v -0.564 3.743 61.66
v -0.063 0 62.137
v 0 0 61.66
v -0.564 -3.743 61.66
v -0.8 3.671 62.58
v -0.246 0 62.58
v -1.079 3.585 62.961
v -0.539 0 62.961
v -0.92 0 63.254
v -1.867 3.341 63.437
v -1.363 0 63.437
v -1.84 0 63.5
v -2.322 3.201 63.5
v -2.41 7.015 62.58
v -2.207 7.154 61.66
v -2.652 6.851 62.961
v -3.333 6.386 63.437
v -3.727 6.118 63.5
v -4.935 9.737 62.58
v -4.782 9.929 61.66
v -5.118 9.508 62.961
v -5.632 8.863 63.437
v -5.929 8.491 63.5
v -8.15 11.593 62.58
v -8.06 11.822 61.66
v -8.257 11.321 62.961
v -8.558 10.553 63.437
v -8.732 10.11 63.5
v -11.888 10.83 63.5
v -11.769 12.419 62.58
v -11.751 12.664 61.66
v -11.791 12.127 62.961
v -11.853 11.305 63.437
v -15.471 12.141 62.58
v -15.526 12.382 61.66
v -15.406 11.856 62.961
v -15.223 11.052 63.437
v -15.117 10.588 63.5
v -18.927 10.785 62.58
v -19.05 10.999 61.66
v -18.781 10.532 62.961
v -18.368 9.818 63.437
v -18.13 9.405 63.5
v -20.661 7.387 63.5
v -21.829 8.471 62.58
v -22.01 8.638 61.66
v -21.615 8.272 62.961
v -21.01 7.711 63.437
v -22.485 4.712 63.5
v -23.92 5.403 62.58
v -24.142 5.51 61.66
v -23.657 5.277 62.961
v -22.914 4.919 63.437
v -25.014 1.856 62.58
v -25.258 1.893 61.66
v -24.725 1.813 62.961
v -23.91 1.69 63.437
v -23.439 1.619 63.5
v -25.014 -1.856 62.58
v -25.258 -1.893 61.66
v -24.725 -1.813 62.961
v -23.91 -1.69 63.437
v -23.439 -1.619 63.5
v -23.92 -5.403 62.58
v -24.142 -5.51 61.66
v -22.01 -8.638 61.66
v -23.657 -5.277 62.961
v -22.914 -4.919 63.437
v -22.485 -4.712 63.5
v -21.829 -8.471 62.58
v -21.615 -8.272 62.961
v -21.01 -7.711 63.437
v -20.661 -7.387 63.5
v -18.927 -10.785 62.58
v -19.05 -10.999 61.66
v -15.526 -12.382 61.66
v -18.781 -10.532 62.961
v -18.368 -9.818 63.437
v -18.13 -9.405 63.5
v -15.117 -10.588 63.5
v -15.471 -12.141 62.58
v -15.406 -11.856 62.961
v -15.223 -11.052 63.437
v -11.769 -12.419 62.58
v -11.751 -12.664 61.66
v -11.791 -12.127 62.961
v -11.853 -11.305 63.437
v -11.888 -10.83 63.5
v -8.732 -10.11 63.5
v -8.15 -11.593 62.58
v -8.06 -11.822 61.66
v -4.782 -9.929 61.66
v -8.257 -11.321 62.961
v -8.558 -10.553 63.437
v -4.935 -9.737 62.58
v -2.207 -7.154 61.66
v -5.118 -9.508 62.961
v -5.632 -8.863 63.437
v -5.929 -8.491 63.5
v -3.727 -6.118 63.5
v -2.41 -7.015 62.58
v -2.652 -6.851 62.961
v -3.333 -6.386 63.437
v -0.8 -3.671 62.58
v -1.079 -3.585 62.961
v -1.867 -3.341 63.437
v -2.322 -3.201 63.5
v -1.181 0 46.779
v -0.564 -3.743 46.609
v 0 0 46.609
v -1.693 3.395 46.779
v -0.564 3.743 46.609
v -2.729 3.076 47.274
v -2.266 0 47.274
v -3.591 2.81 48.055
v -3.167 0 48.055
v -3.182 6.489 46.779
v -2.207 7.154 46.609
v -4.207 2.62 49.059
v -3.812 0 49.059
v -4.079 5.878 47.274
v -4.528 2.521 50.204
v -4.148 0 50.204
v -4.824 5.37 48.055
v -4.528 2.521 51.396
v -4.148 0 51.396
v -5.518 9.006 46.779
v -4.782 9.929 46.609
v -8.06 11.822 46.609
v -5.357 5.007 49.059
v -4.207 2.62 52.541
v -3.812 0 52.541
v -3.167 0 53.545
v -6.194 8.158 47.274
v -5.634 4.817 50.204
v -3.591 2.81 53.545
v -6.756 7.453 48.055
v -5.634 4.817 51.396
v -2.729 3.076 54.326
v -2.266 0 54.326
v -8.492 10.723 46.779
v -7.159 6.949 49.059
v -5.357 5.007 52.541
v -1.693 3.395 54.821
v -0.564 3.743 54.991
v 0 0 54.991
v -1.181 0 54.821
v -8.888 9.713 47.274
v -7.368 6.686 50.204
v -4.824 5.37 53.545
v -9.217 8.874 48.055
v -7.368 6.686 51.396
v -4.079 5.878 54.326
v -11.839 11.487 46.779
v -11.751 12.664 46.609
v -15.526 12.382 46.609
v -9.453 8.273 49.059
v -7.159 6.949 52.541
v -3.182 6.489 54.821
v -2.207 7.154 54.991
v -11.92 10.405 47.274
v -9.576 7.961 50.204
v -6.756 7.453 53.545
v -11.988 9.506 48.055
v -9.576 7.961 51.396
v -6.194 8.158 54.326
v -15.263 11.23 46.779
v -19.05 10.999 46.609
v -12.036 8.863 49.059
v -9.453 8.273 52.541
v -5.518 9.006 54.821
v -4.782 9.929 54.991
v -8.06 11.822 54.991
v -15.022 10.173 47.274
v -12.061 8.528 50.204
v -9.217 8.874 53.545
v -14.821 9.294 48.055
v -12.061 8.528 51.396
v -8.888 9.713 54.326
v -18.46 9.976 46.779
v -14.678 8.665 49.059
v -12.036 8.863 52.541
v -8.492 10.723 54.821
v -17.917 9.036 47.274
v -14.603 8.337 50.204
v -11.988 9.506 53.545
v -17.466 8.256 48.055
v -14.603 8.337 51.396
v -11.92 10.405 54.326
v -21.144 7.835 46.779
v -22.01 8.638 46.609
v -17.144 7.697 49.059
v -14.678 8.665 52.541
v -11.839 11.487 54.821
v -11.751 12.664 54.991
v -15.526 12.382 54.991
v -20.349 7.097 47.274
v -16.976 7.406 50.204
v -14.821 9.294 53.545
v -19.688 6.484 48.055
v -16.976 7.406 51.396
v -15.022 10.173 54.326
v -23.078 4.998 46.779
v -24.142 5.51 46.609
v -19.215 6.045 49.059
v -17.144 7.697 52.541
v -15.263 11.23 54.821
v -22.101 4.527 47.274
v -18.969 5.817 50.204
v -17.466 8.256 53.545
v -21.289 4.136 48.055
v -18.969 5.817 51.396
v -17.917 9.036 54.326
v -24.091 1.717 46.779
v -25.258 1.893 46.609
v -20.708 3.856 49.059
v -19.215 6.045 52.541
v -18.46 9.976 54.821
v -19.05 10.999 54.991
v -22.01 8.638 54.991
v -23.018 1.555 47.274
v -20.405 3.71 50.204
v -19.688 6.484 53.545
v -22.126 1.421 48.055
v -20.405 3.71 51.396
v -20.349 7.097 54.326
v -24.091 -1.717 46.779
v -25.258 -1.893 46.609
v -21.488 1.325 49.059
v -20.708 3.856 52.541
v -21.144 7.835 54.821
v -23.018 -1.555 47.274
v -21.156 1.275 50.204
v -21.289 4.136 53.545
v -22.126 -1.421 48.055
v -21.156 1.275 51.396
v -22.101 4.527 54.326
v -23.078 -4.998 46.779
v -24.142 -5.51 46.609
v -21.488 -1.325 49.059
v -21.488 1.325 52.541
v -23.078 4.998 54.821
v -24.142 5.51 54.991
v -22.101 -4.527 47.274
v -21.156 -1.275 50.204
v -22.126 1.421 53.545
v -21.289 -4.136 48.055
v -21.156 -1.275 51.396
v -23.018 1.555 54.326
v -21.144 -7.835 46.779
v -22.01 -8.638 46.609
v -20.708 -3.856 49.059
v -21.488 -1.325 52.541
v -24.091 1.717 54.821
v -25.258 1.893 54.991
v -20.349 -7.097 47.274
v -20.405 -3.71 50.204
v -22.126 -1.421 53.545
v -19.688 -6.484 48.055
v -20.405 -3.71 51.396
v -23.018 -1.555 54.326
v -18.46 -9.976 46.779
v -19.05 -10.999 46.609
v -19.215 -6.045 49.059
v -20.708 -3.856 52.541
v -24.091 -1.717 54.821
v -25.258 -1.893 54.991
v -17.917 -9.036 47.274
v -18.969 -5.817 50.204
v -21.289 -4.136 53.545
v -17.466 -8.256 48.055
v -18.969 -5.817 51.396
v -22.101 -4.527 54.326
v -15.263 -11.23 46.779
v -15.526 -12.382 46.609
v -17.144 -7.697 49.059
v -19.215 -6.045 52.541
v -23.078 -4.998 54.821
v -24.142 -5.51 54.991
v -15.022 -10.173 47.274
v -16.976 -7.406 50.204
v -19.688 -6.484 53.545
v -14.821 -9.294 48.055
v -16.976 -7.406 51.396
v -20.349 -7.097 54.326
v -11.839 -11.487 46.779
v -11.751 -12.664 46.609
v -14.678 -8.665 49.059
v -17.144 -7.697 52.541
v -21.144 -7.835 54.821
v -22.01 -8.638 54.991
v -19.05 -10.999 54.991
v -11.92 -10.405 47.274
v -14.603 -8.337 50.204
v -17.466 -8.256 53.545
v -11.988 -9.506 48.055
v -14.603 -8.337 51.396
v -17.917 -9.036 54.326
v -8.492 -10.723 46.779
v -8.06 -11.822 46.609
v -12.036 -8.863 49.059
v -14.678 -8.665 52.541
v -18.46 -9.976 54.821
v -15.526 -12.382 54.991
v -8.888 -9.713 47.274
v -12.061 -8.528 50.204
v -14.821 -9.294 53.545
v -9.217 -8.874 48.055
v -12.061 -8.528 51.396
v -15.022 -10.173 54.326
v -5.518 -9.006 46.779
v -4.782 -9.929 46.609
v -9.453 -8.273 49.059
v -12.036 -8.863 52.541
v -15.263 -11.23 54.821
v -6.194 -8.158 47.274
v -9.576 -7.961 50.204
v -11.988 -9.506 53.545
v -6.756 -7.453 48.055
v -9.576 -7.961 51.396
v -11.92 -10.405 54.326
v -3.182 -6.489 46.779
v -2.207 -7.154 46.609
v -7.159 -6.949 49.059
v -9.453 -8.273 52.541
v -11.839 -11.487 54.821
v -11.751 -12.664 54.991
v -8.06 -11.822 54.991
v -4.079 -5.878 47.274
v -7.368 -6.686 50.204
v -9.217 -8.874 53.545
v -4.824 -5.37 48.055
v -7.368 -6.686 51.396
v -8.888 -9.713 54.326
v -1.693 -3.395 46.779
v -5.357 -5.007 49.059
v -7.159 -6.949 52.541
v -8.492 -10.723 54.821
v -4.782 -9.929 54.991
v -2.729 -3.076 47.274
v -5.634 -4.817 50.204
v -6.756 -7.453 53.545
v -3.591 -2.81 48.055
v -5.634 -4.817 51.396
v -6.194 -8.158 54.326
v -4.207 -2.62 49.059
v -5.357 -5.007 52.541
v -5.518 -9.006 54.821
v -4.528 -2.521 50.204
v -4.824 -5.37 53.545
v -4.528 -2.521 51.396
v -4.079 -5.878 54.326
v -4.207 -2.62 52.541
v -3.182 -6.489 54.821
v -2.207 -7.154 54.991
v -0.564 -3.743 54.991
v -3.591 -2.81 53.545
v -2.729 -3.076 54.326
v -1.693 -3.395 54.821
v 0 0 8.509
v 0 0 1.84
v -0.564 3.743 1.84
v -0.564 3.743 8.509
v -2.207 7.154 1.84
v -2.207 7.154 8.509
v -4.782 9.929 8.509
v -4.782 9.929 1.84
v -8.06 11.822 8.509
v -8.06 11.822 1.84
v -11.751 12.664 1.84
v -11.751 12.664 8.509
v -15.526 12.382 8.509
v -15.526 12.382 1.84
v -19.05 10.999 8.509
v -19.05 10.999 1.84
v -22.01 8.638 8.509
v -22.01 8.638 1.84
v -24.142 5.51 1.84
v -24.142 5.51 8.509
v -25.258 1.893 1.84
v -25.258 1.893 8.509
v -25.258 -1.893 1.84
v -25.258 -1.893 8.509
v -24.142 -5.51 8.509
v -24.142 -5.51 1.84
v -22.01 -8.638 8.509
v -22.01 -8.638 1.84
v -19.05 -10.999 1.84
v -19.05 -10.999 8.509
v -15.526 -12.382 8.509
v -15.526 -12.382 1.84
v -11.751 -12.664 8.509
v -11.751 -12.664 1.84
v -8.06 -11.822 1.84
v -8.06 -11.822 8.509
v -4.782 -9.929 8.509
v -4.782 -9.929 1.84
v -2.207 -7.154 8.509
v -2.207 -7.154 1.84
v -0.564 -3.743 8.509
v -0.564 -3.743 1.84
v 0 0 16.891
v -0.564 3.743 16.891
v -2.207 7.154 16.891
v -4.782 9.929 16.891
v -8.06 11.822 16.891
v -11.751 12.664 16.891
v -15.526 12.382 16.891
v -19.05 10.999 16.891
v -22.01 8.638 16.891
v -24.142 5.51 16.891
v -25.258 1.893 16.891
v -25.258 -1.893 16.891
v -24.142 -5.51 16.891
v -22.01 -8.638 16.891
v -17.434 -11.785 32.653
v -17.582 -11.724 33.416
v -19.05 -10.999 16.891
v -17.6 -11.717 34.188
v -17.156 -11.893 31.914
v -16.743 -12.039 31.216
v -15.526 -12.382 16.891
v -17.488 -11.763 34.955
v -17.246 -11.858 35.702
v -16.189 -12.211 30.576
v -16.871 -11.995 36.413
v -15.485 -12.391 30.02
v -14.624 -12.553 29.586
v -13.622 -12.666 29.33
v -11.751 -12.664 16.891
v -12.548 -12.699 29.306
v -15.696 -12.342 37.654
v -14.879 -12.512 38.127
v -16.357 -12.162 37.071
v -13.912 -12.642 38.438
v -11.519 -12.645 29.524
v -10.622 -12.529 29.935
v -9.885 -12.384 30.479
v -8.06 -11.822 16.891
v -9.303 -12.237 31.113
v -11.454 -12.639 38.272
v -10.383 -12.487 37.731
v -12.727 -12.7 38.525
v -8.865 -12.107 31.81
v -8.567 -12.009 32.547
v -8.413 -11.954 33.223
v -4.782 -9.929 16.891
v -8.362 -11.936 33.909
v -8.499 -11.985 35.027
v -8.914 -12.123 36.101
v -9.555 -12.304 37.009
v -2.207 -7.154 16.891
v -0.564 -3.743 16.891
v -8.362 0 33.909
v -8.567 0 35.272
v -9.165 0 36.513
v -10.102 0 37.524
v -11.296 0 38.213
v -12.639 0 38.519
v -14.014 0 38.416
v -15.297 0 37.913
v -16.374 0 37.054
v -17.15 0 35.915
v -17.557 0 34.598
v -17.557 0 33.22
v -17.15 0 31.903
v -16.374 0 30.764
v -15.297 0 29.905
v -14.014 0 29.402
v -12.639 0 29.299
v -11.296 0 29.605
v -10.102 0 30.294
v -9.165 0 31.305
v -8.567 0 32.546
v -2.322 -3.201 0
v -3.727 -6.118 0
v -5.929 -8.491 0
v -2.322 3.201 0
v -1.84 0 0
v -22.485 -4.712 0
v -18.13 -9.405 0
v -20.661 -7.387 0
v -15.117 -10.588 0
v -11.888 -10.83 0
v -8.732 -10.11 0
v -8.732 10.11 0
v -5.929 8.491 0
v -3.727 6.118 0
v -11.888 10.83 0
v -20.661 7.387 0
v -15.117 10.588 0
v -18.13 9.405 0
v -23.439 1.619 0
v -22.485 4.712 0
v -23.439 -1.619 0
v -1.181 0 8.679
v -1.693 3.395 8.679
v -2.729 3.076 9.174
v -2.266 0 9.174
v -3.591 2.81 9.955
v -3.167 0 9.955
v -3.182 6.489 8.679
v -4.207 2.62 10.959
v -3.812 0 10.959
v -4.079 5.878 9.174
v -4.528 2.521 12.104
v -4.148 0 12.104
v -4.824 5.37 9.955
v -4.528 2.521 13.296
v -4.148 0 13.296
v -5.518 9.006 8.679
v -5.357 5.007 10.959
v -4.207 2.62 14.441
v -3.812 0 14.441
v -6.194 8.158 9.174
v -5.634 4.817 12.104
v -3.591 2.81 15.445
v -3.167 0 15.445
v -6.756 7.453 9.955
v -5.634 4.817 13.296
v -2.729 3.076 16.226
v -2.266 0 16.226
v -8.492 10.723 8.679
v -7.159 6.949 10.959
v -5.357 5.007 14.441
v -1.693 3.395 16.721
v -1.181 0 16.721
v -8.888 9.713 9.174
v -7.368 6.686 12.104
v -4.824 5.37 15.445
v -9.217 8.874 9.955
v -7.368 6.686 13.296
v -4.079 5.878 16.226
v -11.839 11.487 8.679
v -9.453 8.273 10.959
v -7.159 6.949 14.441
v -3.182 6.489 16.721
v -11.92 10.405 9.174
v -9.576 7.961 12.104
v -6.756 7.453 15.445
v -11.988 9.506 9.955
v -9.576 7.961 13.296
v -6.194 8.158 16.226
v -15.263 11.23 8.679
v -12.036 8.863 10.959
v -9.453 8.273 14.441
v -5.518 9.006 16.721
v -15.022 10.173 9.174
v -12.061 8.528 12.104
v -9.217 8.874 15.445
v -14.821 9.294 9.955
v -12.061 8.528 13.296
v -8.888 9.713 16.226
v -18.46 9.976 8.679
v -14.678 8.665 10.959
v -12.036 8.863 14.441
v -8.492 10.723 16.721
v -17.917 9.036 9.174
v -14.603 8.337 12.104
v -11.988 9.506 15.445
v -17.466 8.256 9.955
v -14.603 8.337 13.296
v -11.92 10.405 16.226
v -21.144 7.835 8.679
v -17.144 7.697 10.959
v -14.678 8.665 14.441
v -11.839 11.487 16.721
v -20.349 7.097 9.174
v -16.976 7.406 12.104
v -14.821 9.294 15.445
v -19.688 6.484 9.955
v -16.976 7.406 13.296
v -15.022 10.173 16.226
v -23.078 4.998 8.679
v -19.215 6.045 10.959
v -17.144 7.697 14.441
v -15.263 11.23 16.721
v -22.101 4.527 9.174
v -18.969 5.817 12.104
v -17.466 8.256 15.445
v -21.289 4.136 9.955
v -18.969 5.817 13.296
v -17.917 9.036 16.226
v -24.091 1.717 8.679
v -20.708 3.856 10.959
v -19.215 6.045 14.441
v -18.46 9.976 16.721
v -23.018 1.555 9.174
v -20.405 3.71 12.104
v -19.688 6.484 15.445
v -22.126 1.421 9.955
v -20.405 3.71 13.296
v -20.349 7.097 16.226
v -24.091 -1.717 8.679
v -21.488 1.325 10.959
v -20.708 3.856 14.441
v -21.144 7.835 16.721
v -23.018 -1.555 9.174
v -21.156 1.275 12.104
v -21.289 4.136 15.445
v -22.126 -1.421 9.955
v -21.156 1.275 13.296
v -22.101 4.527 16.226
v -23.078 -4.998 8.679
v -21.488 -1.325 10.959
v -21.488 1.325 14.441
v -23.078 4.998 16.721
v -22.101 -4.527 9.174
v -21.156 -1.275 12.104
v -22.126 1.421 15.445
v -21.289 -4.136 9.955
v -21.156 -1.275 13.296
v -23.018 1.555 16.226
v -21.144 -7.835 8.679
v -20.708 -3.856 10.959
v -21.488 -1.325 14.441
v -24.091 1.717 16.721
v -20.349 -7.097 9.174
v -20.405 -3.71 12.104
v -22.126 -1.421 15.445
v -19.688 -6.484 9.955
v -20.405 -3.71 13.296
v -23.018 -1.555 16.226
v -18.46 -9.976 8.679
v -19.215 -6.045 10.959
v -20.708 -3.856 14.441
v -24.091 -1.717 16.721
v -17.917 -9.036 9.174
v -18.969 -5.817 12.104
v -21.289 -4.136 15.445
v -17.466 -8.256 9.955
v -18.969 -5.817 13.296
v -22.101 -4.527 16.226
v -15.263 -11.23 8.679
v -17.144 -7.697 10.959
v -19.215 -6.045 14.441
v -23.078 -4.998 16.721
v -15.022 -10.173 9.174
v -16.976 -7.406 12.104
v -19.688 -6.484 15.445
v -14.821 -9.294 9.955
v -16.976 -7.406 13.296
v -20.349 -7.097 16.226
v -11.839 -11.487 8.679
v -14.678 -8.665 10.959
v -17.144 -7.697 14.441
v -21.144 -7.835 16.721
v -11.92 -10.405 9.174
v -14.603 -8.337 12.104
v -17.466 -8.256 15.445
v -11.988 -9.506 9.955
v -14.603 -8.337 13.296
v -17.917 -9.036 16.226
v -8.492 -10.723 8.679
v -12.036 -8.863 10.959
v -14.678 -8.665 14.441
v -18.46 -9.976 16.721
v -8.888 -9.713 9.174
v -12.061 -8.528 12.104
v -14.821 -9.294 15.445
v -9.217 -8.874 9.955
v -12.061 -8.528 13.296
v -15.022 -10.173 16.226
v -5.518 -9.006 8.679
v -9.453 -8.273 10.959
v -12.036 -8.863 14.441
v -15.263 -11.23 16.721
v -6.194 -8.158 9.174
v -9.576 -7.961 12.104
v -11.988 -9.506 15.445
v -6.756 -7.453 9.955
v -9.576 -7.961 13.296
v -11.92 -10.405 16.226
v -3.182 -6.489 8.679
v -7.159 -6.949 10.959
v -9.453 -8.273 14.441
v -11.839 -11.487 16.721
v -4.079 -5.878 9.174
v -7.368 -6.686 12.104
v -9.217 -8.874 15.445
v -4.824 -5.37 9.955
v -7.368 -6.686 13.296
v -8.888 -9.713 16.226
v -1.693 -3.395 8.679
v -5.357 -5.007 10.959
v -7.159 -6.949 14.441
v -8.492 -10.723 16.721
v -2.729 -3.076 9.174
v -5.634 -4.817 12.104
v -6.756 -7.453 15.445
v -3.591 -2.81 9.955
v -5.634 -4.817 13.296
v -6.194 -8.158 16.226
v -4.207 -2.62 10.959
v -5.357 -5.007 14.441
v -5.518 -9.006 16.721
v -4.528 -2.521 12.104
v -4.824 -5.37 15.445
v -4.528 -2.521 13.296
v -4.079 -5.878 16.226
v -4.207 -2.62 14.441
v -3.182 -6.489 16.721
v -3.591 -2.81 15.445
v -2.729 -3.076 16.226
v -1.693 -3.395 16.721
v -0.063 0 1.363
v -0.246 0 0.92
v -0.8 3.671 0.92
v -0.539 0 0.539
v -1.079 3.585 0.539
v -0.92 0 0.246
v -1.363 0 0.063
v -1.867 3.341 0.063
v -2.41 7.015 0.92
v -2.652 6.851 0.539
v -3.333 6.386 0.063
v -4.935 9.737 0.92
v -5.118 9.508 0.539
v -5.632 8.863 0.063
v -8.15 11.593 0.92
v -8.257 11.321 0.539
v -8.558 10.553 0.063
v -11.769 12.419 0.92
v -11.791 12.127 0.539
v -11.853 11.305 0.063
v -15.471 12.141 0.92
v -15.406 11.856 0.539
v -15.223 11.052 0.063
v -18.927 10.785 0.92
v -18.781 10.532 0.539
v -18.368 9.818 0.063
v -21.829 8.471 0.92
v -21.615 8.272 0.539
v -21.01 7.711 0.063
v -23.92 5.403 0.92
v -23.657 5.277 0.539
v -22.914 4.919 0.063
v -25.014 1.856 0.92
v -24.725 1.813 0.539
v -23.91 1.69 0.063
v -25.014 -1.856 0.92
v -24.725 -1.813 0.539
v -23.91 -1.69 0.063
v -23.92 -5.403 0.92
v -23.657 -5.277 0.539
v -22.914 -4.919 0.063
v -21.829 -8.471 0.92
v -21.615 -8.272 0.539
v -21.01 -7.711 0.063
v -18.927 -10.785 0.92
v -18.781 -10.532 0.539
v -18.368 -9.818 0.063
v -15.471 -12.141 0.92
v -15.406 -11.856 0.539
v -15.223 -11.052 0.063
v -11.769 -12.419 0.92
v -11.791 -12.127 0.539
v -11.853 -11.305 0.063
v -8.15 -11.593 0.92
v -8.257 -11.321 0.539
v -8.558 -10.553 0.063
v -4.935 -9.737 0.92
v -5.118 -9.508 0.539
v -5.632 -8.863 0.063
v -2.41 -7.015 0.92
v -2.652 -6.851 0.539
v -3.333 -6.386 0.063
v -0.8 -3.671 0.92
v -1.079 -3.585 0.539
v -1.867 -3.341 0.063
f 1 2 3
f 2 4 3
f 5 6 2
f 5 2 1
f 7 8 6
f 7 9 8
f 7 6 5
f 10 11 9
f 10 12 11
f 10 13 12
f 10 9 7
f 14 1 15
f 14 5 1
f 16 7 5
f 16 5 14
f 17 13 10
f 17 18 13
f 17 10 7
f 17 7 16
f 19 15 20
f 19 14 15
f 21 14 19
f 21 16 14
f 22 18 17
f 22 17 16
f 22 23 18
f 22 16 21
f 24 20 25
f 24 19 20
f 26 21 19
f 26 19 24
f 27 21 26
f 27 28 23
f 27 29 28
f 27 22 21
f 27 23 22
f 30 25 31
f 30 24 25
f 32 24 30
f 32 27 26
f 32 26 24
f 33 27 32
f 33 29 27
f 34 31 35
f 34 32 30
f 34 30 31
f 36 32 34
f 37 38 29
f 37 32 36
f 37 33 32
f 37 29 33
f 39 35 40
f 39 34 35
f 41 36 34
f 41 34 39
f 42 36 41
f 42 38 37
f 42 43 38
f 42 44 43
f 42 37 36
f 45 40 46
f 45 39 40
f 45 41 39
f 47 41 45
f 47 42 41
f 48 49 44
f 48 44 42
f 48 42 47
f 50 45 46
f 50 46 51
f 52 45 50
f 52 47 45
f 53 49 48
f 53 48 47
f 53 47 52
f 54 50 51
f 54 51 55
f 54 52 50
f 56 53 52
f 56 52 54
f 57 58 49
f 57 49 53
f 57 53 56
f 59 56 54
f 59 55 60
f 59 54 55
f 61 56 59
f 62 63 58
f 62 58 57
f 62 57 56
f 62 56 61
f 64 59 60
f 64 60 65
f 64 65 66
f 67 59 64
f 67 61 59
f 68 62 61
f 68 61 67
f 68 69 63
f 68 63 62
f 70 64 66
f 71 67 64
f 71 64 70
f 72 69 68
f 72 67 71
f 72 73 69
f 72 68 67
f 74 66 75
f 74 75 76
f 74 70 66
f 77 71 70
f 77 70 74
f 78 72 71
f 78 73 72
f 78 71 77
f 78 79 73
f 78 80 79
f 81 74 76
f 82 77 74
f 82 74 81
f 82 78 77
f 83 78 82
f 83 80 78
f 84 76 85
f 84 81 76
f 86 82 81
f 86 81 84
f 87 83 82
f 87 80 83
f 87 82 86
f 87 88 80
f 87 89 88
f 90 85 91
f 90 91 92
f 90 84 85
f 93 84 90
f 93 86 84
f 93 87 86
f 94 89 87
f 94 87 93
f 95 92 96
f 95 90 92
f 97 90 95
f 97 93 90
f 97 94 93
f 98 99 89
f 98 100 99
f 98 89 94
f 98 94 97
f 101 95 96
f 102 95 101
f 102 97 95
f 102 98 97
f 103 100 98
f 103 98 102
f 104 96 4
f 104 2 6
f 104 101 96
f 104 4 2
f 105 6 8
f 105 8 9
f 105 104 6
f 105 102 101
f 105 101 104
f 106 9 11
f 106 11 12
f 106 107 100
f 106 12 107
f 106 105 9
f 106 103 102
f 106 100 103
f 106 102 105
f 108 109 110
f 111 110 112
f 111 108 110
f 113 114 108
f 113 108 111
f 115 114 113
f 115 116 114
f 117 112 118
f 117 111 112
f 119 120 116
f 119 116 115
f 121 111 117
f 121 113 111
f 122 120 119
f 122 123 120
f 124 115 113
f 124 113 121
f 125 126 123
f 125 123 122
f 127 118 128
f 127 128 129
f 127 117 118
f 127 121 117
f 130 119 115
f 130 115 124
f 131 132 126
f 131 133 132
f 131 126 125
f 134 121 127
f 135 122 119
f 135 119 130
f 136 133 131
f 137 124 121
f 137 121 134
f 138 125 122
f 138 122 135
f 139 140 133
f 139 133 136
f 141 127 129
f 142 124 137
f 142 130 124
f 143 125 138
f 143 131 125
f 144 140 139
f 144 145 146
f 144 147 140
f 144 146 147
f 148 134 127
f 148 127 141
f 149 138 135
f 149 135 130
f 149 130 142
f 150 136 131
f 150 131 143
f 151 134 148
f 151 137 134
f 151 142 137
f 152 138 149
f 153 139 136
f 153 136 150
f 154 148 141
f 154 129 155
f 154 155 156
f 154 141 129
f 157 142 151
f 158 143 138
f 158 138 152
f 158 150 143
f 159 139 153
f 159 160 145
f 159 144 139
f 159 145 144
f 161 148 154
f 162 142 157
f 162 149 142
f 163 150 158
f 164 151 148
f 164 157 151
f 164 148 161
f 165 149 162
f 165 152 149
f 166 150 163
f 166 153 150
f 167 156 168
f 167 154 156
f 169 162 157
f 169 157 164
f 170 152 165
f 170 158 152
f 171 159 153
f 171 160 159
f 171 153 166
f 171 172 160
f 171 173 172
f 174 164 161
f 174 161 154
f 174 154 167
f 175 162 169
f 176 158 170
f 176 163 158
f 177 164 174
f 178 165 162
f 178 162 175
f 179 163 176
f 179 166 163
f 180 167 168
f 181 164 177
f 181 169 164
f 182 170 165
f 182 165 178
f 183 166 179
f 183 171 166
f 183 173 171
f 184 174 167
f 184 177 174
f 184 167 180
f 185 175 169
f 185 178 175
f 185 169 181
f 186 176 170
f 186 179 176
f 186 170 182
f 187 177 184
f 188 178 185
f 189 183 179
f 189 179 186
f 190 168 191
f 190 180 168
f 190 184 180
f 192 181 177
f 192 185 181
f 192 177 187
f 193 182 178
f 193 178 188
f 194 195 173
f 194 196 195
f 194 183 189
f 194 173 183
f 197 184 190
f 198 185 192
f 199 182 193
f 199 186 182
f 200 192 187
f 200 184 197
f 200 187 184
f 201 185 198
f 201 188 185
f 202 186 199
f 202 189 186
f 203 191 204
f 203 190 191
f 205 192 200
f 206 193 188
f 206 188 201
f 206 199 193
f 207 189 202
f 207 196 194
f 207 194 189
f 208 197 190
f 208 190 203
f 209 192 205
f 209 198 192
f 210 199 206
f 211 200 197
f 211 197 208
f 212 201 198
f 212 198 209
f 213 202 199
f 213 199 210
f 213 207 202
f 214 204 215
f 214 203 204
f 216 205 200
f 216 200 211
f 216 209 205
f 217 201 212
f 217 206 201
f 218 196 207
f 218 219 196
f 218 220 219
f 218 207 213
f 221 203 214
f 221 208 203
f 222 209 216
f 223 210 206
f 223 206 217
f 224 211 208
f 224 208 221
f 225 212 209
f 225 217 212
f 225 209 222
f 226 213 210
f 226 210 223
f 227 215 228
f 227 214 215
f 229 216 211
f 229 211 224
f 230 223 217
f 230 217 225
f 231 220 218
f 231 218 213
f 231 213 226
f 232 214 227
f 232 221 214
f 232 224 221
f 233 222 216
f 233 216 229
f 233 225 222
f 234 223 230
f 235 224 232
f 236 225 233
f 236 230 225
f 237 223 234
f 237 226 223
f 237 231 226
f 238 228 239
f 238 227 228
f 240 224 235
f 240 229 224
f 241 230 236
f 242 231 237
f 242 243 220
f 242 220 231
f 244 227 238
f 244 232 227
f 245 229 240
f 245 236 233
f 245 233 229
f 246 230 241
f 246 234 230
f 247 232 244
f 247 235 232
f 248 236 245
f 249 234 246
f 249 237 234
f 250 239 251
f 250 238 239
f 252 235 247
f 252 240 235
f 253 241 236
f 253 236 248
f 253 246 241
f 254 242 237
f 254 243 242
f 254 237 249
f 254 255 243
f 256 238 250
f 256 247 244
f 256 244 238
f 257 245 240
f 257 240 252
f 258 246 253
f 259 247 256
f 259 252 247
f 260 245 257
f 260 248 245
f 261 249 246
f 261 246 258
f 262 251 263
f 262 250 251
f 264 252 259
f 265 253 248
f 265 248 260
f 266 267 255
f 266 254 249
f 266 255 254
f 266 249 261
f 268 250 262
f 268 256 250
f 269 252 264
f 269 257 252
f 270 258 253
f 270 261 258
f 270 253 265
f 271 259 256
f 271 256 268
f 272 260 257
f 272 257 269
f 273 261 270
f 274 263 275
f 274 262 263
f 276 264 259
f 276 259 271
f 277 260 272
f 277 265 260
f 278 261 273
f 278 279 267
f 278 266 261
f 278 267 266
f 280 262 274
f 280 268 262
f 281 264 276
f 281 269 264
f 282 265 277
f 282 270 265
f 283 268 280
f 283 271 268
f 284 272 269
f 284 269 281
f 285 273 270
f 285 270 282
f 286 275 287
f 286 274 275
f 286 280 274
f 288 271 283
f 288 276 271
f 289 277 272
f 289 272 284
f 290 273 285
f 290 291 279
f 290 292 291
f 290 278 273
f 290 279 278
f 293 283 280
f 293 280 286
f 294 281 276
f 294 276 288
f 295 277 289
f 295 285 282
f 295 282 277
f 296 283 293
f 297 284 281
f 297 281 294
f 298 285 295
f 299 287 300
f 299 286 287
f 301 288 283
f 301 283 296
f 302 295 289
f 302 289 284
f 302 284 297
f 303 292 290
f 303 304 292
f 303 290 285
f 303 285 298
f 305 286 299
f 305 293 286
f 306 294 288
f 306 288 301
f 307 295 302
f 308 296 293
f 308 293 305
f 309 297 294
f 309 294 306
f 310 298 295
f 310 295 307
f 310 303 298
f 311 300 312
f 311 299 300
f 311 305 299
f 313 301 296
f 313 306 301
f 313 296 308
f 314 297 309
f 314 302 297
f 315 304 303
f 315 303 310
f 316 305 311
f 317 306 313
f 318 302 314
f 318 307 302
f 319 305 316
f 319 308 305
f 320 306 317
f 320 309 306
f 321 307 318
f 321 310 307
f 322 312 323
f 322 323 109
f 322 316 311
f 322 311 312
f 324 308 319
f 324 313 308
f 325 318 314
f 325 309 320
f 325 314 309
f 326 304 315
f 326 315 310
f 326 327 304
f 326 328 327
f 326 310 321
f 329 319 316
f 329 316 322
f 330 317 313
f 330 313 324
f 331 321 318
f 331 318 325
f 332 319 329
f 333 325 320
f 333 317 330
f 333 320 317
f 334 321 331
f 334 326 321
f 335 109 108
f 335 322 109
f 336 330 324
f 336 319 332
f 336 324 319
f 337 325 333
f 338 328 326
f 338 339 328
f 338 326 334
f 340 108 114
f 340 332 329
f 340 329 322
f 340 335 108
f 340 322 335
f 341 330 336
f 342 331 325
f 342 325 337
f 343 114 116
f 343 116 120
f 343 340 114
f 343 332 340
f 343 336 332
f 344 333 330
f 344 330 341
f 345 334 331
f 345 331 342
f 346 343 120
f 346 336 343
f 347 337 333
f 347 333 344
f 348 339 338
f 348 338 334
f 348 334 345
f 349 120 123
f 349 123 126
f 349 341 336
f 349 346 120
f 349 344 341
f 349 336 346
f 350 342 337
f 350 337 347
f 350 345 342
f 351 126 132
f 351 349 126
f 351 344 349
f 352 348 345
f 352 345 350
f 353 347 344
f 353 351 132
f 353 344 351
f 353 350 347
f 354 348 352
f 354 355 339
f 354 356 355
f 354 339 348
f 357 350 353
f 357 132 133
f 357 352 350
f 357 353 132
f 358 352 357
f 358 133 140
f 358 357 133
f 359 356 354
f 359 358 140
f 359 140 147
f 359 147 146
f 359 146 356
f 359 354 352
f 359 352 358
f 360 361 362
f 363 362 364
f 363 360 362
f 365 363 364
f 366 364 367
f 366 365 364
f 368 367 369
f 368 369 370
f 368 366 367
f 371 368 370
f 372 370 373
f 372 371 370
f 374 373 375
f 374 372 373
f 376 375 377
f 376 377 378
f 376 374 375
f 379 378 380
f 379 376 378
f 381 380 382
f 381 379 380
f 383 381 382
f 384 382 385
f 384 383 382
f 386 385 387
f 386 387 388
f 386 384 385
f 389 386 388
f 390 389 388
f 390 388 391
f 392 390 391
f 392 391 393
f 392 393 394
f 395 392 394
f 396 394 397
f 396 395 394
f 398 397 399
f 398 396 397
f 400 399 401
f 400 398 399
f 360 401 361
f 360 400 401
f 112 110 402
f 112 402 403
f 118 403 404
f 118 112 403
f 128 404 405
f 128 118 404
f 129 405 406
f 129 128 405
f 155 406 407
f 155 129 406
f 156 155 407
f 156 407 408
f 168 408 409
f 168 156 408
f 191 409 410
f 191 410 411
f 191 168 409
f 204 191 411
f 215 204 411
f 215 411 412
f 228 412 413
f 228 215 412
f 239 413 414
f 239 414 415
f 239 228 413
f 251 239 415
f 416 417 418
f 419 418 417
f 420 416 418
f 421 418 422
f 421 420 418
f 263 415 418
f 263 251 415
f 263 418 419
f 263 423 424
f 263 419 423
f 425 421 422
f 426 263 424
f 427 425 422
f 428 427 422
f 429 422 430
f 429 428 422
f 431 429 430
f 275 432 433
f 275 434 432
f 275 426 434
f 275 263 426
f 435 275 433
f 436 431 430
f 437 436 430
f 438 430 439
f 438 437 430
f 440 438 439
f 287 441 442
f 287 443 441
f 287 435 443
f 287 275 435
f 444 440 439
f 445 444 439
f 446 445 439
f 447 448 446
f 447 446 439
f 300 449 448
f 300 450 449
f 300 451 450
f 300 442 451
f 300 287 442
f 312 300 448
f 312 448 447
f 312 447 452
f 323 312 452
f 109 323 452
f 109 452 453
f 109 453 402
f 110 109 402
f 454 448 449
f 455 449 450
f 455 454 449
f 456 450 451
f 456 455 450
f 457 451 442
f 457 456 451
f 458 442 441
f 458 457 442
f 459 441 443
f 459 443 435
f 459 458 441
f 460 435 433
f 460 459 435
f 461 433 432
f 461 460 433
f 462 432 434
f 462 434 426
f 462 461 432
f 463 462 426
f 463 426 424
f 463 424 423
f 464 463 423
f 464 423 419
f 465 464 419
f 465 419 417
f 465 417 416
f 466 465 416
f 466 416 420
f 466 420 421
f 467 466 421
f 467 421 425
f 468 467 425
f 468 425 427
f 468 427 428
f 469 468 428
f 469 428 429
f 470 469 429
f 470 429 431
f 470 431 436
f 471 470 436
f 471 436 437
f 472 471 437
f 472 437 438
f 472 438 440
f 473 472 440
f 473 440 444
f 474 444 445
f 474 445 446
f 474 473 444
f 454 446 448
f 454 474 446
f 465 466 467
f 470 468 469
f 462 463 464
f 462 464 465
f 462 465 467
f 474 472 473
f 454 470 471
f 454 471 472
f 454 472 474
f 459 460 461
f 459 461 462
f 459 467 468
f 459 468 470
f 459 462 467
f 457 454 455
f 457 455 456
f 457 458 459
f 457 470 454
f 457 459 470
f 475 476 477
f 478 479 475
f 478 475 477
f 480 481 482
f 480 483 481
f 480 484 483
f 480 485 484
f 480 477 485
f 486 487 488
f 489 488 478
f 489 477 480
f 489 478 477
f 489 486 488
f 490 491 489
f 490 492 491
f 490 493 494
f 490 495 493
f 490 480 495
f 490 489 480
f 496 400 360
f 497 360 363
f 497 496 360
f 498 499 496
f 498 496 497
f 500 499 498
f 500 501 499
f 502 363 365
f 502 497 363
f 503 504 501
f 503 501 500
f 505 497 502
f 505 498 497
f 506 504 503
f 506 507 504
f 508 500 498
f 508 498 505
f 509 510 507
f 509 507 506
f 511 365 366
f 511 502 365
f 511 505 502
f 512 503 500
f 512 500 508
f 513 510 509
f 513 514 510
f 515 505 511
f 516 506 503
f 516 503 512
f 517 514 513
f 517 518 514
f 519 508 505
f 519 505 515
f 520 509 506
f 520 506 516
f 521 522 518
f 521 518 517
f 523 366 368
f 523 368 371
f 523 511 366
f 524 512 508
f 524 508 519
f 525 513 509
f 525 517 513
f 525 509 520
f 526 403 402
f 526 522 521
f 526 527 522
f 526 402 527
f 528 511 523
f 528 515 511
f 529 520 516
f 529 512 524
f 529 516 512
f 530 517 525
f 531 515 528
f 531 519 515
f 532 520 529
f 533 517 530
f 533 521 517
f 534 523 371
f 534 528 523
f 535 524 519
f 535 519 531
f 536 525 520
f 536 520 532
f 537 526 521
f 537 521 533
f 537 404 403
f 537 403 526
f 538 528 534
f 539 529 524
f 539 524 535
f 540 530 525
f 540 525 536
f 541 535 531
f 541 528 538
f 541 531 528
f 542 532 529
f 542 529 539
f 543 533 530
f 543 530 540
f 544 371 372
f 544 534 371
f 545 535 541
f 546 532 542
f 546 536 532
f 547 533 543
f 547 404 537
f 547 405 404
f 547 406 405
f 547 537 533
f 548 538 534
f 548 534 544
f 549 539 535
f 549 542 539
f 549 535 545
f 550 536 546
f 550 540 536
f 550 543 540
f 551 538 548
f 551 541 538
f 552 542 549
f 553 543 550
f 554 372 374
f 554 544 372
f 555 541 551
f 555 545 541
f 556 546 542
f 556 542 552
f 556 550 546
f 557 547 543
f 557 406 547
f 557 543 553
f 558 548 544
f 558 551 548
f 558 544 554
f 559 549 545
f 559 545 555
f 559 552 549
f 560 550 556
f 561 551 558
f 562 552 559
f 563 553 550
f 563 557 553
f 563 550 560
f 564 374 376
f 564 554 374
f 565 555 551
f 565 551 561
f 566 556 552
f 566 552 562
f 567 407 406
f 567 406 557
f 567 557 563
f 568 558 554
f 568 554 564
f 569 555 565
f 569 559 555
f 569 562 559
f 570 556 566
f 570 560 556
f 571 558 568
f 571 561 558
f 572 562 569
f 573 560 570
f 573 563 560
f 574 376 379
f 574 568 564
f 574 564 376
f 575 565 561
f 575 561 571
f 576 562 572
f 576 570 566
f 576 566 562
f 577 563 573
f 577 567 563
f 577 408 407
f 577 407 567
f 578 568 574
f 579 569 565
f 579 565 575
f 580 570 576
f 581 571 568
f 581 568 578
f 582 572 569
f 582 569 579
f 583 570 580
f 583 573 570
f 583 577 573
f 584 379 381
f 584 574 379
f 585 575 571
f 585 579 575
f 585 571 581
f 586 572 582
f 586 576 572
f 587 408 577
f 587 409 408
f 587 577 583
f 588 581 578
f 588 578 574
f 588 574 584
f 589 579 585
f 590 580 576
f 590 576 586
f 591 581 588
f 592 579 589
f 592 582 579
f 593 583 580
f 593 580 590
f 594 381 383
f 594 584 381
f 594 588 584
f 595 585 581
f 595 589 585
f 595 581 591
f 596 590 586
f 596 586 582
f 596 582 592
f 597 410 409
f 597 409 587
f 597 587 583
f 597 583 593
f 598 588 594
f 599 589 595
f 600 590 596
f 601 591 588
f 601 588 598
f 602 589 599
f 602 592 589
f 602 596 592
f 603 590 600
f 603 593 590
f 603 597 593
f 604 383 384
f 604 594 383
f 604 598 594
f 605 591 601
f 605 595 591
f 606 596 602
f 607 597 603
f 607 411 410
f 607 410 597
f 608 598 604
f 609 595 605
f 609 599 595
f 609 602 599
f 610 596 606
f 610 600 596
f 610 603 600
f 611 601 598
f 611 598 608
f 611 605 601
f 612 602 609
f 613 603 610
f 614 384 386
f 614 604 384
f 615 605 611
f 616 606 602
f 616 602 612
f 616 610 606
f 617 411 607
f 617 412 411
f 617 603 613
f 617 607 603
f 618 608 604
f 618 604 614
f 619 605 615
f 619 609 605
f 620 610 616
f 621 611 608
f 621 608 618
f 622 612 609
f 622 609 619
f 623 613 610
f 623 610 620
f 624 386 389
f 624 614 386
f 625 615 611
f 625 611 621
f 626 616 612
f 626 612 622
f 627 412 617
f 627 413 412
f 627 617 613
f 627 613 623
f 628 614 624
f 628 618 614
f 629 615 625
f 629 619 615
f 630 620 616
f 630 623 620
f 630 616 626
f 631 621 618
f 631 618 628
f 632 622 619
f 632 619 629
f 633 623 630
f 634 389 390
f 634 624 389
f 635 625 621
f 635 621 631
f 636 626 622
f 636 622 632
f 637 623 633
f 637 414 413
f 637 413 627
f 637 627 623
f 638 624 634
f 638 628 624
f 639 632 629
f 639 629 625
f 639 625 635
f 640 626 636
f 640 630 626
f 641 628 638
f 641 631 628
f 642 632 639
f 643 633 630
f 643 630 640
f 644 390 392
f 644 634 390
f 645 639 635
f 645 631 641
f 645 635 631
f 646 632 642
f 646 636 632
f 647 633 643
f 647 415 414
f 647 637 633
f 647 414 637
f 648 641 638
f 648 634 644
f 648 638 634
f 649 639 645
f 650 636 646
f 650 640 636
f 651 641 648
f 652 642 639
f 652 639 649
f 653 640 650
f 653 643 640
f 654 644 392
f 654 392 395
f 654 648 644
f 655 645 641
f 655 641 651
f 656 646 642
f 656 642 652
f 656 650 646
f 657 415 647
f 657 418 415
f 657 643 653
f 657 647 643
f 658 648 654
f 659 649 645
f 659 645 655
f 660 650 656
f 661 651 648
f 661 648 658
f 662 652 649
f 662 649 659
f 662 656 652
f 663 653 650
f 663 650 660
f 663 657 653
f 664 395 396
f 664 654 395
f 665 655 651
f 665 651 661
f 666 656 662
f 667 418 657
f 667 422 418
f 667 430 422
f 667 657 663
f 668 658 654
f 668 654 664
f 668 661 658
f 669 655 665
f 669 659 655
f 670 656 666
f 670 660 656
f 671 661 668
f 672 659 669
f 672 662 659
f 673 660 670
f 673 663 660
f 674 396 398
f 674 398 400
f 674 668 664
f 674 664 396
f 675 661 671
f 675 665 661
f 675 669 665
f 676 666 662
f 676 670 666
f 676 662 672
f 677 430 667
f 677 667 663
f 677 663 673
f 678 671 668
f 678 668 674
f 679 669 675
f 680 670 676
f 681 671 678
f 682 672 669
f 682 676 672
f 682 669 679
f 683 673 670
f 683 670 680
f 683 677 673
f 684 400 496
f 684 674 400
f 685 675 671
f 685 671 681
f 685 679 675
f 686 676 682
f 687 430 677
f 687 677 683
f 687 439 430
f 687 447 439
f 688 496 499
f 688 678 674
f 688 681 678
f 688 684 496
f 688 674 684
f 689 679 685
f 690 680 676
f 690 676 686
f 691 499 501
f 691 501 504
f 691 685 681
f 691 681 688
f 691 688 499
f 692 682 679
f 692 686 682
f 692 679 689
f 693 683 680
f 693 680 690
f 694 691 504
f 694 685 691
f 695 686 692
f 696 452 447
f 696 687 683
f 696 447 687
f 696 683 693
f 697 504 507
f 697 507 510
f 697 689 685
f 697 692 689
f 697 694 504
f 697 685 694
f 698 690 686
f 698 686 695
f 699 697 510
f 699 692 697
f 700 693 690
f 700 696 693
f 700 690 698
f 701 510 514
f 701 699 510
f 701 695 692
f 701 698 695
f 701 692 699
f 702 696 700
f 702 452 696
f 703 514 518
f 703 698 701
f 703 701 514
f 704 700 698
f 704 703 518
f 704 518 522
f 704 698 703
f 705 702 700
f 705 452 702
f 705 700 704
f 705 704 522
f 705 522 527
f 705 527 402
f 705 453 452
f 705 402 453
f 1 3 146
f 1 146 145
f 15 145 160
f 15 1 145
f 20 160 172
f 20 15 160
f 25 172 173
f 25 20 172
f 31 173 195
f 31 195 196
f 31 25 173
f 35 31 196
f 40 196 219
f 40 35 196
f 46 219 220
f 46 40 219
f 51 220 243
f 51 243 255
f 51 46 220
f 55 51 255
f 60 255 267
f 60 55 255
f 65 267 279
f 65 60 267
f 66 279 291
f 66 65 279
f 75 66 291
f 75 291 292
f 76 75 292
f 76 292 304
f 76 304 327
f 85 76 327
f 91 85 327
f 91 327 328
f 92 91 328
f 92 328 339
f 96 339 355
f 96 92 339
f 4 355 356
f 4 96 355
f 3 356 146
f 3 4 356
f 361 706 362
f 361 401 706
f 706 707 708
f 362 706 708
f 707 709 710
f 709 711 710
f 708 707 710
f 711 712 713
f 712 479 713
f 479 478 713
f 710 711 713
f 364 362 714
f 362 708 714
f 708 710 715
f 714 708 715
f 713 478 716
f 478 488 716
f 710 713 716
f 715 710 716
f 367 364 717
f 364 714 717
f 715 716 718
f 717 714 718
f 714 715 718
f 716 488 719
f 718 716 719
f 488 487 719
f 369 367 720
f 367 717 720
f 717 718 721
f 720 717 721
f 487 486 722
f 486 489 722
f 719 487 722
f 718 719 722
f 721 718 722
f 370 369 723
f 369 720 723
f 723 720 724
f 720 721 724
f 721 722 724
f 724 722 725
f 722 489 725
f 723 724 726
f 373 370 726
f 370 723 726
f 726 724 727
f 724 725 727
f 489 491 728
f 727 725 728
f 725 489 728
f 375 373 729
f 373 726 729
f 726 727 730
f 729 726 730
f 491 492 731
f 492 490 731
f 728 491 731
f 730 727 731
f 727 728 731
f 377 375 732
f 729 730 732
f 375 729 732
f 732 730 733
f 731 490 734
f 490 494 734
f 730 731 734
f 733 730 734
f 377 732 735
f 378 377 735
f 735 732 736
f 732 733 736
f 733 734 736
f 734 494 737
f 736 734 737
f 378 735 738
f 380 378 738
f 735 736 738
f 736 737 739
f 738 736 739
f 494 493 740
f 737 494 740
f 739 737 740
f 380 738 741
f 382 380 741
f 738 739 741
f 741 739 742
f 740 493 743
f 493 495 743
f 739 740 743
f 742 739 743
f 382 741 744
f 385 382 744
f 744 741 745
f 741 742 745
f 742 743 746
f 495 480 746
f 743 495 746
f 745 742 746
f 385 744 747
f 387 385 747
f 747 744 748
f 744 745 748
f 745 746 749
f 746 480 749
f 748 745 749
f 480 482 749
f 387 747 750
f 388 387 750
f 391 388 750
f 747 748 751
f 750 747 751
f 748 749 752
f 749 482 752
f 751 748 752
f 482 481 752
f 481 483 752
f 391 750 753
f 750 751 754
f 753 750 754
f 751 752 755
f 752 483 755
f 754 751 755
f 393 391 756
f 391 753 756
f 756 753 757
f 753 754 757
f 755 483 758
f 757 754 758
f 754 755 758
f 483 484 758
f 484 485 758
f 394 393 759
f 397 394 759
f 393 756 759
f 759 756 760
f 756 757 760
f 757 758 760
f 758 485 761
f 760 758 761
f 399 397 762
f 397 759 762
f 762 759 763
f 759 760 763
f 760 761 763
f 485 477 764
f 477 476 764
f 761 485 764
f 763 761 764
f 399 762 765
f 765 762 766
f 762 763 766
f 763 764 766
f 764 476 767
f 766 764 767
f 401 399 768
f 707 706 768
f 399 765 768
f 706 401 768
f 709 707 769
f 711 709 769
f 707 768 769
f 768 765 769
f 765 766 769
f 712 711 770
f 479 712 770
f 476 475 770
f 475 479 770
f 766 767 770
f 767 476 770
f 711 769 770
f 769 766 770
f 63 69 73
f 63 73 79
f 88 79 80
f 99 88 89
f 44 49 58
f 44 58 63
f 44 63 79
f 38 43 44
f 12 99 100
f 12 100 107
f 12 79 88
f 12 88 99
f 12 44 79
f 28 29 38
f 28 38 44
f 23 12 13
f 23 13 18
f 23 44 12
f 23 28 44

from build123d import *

# Parameters (mm, degrees)
F2_R     = 1.839631
F3_R     = 1.839631
F4_R     = 4.623379
F5_DEPTH = 25.4


with BuildPart() as f1:
    # F0 (on Front) → F1 (revolve)
    with BuildSketch(Plane.XZ):
        with BuildLine():
            Line((-12.7, 0), (0, 0))
            Line((0, 0), (0, 8.509))
            ThreePointArc((0, 8.509), (-4.191, 12.7), (0, 16.891))
            Line((0, 16.891), (0, 46.609))
            ThreePointArc((0, 46.609), (-4.191, 50.8), (0, 54.991))
            Line((0, 54.991), (0, 63.5))
            Line((0, 63.5), (-12.7, 63.5))
            Line((-12.7, 63.5), (-12.7, 0))
        make_face()
    revolve(axis=Axis((-12.7, 0, 31.75), (0, 0, 1)))

    # F2
    f2_edges = [f1.edges().sort_by_distance(p)[0] for p in [
        (-25.4, 0, 63.5),
    ]]
    fillet(f2_edges, radius=F2_R)

    # F3
    f3_edges = [f1.edges().sort_by_distance(p)[0] for p in [
        (-25.4, 0, 0),
    ]]
    fillet(f3_edges, radius=F3_R)

    # F4 (on Front) → F5 (cut)
    with BuildSketch(Plane.XZ):
        with Locations((-12.984917, 33.909)):
            Circle(F4_R)
    extrude(amount=F5_DEPTH, mode=Mode.SUBTRACT)


solid = f1.part
